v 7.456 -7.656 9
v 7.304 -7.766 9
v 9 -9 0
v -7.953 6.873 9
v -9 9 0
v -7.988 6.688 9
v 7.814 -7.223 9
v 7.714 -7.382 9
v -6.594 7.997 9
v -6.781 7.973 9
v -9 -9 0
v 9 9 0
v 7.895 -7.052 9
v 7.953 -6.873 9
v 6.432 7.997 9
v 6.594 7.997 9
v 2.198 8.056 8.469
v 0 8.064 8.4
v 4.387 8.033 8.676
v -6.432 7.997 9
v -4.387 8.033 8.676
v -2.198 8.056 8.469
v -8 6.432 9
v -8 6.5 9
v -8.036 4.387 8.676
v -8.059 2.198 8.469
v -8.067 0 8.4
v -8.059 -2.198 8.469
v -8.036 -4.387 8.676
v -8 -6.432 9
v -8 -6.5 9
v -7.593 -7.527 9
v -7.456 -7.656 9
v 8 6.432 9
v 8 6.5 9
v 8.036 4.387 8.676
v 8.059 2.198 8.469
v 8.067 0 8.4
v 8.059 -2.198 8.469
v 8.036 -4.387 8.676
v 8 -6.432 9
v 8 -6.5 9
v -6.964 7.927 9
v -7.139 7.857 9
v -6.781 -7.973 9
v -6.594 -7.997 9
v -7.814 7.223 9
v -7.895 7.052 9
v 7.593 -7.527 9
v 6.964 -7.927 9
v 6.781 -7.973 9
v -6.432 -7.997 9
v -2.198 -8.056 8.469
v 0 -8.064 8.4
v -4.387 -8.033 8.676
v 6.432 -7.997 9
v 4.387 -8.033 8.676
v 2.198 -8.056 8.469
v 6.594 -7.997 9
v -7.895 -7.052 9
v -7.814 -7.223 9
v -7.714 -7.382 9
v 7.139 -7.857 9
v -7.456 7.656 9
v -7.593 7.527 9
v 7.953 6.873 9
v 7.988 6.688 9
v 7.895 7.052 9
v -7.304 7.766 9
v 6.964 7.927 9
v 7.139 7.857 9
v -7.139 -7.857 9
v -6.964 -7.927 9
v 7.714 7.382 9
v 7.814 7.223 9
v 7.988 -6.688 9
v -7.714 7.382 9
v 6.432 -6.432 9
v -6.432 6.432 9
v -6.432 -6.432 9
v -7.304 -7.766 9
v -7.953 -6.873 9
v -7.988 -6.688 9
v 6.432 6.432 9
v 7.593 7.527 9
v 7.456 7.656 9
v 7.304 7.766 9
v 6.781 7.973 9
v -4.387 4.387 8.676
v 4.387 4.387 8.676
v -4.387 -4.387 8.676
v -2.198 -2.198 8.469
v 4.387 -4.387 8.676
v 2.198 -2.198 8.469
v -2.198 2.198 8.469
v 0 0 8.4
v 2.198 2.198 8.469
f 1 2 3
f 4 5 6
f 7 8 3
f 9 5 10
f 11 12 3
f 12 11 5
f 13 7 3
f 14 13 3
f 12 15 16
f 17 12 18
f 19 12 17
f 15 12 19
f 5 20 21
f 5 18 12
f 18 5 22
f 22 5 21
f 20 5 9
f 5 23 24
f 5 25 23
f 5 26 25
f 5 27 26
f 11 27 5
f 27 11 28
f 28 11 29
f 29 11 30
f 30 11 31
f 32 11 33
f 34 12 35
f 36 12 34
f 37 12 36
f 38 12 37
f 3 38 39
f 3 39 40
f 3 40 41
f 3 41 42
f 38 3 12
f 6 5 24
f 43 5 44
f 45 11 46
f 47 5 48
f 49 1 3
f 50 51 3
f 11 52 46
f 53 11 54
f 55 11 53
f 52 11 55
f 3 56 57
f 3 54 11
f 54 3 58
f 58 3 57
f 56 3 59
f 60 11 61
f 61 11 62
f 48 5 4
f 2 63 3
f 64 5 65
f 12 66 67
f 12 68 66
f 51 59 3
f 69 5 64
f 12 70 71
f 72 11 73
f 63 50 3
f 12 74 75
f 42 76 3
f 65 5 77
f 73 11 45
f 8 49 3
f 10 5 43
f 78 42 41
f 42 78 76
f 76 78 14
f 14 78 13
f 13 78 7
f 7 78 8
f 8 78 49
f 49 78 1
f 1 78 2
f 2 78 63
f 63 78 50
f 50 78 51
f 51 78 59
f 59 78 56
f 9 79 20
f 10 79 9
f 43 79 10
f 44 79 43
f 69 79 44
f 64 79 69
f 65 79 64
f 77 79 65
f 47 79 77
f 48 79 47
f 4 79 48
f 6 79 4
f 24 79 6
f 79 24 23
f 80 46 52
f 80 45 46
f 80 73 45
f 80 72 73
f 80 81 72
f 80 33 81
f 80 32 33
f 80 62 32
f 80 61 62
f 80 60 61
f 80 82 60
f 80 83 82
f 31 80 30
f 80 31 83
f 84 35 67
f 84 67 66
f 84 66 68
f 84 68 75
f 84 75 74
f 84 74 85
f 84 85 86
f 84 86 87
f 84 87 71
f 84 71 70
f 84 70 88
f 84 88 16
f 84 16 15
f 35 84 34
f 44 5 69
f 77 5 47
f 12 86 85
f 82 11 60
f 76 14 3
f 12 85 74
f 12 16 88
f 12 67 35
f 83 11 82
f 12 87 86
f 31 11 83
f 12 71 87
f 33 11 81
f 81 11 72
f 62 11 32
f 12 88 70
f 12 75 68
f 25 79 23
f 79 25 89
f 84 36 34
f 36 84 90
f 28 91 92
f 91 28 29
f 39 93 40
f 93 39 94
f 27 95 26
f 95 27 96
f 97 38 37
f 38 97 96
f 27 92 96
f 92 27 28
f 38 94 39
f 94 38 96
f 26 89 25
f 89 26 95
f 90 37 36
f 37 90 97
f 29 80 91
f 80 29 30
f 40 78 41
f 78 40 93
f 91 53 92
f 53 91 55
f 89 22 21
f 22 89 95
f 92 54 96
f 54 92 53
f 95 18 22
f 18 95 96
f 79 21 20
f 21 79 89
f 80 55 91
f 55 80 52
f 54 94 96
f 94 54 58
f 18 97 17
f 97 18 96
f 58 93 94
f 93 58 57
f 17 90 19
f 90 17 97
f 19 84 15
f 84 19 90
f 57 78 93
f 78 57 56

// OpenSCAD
SWITCH_HEIGHT = 9;
CYLINDRICAL_RADIUS = 35;
CYLINDRICAL_DEPTH = 0.6;
SWITCH_BOTTOM_WIDTH = 18;
SWITCH_TOP_WIDTH = 14.5;
SWITCH_CORNER_RADIUS = 1.5;

module SwitchCutout()
{
	translate([-10, 0, CYLINDRICAL_RADIUS + SWITCH_HEIGHT - CYLINDRICAL_DEPTH])
	rotate([0,90,0])
	cylinder(r=CYLINDRICAL_RADIUS, h=20, $fn=100);
}

module Switch()
{

	difference()
	{	
		hull()
		{
			cube([SWITCH_BOTTOM_WIDTH,SWITCH_BOTTOM_WIDTH,0.00001], center=true);

			height = 0.01;
			$fn=50;	
			translate([0,0,SWITCH_HEIGHT-height / 2])
			{
				minkowski()
				{
					cube([SWITCH_TOP_WIDTH-SWITCH_CORNER_RADIUS, SWITCH_TOP_WIDTH-SWITCH_CORNER_RADIUS, height], center=true);
					translate([0, 0, -height])
					cylinder(r=SWITCH_CORNER_RADIUS, h=height);
				}
			}
		}
		SwitchCutout();
		rotate([0, 0, 90])
		SwitchCutout();
	}
}

Switch();
